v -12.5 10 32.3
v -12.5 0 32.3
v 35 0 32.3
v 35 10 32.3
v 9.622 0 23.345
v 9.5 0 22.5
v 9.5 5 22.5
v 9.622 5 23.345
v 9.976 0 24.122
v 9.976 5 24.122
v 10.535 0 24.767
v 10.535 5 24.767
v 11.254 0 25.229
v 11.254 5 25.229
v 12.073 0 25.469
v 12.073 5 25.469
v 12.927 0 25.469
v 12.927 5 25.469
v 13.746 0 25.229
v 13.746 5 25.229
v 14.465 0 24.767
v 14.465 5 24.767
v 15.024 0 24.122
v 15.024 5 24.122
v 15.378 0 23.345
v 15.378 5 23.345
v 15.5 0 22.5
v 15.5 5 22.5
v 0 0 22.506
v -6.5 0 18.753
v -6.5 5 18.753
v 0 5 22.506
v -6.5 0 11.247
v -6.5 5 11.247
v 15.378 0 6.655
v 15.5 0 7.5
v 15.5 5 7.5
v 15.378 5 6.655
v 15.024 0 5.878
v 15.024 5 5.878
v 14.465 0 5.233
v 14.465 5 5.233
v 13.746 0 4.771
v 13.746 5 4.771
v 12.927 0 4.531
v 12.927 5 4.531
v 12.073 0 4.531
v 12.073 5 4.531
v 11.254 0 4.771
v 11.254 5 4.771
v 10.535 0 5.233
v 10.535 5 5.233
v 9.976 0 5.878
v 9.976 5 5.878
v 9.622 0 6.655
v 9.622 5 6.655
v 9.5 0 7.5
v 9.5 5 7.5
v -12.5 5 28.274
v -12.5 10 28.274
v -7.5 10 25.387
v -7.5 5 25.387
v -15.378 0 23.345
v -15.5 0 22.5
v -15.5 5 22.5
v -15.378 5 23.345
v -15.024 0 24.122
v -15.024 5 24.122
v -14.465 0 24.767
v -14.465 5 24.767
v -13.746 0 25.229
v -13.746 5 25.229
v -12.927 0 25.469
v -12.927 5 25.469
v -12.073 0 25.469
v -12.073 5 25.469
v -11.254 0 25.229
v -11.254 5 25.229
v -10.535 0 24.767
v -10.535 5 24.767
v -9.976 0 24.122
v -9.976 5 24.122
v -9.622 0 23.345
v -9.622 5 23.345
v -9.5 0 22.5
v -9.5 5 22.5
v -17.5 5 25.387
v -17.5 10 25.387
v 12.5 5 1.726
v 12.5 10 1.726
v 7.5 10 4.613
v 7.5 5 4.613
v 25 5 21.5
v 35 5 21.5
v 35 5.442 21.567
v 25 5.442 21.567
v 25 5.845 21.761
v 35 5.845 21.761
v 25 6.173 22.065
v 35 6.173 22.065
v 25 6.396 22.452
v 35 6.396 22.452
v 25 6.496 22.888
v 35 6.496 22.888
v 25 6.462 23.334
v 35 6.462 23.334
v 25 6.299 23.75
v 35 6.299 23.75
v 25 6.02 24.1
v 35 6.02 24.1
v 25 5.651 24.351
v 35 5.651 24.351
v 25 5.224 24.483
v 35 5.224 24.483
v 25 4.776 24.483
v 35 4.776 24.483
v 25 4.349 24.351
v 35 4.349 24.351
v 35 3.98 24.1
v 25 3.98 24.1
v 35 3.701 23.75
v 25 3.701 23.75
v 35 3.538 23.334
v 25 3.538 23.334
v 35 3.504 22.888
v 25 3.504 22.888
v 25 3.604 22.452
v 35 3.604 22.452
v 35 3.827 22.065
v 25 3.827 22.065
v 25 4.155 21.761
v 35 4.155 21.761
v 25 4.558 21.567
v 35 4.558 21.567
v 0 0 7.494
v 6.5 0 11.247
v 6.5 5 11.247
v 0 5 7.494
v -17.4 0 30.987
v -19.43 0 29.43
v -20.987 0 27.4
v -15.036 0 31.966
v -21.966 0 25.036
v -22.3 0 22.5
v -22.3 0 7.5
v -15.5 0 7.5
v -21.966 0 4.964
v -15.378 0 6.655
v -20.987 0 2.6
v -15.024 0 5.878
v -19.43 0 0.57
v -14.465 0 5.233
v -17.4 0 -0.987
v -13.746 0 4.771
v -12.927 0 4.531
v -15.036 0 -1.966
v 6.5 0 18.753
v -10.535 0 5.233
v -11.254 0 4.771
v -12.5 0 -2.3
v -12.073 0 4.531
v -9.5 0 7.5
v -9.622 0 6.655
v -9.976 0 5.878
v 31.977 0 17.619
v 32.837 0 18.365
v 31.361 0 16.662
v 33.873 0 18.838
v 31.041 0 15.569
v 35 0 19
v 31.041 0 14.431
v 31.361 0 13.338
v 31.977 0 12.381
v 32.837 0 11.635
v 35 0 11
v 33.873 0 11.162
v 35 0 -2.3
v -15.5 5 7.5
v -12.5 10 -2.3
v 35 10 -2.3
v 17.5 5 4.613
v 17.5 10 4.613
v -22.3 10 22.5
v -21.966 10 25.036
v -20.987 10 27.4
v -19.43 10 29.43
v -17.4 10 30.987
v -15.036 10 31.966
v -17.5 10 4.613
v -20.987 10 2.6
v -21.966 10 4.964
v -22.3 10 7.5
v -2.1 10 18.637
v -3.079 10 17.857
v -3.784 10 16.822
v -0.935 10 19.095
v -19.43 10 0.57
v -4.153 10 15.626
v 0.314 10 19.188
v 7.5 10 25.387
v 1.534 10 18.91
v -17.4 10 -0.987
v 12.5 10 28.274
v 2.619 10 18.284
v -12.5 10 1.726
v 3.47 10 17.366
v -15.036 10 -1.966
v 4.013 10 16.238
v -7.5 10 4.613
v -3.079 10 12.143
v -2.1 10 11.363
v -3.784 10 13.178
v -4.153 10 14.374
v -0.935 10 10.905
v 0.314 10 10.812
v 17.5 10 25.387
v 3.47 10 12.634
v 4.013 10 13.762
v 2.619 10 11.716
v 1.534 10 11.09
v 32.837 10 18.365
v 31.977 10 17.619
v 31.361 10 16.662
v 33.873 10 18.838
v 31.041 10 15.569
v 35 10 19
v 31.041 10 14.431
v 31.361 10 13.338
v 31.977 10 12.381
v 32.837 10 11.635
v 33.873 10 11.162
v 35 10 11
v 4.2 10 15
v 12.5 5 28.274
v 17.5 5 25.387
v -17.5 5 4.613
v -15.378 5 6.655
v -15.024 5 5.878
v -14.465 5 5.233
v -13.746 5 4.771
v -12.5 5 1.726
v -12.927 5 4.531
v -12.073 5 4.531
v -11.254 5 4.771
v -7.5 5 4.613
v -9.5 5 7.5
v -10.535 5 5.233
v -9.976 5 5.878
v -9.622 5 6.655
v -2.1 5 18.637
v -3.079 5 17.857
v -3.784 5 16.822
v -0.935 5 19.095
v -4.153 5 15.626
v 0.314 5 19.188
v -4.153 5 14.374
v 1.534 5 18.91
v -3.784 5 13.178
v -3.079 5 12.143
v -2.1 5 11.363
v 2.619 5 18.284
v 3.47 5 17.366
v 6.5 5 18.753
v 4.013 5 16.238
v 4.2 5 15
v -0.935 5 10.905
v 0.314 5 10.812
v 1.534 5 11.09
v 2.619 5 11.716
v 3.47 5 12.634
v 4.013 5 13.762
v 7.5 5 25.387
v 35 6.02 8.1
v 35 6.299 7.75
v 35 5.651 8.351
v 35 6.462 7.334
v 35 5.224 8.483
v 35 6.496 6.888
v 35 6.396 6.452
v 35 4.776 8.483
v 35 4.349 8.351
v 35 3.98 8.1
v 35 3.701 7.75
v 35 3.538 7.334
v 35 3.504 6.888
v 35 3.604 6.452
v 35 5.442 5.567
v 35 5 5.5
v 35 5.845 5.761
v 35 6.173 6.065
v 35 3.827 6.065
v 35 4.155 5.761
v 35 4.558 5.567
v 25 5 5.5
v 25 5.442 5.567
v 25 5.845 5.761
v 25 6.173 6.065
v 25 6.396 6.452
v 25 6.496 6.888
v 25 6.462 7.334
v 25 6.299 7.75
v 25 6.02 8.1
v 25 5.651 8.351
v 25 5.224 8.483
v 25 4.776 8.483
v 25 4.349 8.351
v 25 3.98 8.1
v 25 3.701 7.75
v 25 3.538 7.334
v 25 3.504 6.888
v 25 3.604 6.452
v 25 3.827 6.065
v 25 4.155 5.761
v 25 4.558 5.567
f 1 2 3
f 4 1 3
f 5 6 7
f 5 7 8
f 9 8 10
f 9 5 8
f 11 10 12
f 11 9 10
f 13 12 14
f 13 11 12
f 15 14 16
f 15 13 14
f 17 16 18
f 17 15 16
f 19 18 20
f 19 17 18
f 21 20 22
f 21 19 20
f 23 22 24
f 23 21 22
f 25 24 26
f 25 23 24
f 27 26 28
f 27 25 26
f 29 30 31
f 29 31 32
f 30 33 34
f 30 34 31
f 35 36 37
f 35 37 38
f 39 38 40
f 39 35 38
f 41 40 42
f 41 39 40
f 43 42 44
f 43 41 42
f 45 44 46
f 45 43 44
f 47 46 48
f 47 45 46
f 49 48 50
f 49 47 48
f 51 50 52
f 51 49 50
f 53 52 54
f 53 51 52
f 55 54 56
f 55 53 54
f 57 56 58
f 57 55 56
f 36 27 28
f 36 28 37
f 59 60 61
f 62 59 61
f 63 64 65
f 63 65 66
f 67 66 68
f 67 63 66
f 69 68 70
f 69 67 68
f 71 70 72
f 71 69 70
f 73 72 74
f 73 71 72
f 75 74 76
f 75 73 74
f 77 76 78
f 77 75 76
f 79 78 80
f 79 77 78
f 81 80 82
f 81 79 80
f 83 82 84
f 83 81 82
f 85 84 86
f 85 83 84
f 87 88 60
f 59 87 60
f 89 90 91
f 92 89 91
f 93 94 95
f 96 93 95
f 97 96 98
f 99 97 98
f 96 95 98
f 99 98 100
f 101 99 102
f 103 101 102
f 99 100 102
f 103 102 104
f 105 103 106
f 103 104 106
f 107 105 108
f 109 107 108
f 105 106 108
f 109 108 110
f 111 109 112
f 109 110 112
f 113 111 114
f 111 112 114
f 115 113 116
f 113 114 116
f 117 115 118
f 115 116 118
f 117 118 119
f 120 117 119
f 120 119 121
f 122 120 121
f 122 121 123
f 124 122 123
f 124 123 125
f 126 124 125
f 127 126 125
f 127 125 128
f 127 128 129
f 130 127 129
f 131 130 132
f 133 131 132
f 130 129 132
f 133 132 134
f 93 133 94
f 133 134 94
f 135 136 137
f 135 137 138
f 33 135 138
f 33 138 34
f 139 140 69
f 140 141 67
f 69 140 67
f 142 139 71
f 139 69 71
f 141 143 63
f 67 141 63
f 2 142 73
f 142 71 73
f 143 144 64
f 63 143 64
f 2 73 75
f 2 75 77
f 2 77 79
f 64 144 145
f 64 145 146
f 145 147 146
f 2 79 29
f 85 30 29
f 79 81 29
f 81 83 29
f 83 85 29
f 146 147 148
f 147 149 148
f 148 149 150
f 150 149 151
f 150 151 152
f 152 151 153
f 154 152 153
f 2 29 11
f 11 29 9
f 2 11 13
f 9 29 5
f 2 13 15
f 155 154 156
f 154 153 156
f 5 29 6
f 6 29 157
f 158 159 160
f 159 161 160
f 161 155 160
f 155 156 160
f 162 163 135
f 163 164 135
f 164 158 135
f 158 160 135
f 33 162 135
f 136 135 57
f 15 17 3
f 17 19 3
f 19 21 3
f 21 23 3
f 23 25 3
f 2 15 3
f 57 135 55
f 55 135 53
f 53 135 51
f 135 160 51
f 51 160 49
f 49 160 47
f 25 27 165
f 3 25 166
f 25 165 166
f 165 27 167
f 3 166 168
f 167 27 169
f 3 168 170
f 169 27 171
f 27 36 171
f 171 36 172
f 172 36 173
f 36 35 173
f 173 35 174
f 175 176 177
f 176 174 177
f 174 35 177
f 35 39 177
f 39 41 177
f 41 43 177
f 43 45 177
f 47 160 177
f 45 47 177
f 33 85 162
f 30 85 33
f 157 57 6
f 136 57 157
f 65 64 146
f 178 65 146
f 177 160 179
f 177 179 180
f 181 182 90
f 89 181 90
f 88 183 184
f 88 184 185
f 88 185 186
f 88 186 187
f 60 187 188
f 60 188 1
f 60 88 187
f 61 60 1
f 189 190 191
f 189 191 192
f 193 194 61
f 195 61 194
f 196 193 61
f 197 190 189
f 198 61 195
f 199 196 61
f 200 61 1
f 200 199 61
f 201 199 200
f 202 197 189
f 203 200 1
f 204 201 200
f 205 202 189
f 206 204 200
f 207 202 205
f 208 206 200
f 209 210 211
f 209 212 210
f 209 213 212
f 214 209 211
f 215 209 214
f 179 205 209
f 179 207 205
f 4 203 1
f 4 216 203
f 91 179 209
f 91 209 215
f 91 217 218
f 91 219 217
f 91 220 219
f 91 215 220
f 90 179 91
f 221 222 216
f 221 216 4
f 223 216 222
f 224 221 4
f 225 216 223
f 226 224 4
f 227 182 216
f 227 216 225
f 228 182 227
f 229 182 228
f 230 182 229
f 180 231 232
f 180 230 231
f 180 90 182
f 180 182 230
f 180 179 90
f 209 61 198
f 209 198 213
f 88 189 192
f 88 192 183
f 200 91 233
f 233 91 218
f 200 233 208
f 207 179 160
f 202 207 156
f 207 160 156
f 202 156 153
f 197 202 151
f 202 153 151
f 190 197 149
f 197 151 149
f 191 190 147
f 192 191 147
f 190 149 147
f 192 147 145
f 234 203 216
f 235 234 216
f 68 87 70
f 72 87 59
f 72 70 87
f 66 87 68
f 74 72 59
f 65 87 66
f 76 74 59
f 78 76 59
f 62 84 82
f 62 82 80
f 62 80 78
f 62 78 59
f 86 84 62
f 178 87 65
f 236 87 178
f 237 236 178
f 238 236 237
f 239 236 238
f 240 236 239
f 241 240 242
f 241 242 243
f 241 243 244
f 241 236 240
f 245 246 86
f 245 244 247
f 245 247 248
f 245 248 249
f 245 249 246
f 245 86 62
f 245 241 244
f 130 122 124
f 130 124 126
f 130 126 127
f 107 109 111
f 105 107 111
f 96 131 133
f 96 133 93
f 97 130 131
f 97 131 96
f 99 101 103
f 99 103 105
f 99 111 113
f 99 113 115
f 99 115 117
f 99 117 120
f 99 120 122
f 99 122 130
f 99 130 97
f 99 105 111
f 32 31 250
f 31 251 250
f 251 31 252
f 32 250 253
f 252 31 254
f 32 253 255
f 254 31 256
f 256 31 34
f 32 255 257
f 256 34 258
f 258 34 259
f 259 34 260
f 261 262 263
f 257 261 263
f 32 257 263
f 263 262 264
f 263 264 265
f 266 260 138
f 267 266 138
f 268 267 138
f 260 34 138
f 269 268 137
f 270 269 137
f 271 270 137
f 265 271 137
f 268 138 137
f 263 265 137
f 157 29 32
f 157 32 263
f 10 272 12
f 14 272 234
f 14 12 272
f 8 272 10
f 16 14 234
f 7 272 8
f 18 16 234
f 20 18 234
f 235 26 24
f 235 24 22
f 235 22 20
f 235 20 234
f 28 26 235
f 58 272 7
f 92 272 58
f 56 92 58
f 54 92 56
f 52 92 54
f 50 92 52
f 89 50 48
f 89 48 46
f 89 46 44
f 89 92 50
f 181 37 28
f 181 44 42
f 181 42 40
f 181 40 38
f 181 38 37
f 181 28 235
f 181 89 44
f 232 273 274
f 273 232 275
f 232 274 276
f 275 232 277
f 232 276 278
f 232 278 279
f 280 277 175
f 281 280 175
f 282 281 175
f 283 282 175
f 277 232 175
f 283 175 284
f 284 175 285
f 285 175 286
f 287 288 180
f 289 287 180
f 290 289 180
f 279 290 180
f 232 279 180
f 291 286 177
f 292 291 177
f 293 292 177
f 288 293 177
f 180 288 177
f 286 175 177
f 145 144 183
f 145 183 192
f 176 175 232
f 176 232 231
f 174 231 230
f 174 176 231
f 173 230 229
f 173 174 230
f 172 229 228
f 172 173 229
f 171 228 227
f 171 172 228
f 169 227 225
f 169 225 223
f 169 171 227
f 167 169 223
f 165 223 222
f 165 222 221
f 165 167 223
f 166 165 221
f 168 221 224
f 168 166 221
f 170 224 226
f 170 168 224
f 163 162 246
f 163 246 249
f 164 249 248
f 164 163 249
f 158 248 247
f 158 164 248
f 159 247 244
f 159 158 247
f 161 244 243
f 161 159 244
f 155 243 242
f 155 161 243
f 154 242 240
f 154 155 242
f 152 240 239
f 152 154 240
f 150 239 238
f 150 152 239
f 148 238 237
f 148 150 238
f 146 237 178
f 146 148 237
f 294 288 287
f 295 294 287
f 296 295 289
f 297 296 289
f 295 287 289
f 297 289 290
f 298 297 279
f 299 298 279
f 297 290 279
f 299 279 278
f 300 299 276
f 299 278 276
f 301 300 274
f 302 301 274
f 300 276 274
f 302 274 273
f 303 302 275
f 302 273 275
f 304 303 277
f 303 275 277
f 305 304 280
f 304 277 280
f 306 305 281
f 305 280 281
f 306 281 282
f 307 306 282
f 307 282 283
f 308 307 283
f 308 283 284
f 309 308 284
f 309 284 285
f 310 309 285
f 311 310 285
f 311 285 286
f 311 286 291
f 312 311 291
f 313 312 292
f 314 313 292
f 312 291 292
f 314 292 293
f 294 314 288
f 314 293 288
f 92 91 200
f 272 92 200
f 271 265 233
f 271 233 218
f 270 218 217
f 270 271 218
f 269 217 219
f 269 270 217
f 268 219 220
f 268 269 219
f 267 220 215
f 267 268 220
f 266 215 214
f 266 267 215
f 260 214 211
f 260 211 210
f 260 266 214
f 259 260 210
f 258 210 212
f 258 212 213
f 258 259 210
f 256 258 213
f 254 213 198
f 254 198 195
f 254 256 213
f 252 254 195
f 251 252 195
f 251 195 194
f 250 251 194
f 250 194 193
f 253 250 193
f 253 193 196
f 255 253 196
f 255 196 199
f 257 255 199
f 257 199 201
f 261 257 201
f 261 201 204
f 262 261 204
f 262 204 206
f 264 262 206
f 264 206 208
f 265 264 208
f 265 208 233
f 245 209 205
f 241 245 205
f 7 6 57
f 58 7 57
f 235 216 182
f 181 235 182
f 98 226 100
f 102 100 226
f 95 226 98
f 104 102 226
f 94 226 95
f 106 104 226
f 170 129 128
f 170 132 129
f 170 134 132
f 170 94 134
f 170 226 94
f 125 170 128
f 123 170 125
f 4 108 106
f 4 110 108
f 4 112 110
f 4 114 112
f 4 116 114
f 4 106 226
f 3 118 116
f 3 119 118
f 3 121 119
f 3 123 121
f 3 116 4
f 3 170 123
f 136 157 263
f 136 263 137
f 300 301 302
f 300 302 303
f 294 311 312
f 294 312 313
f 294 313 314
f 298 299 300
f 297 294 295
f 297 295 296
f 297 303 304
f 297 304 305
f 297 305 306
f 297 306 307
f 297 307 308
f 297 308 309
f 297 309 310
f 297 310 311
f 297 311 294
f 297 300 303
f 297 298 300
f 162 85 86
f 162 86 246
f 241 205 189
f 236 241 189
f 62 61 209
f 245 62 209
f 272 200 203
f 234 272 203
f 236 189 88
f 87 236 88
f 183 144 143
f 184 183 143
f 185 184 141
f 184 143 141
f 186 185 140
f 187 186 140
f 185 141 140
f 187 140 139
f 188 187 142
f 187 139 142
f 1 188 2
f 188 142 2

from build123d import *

# Parameters (mm, degrees)
SKETCH_R             = 4.2
PAD_DEPTH            = 10
POCKET_DEPTH         = 5
POCKET001_DEPTH      = 5
SKETCH003_R          = 1.5
POCKET002_DEPTH      = 10
BODY_PLACEMENT_ANGLE = 270


with BuildPart() as part:
    # Sketch → Pad (new body)
    with BuildSketch(Plane.XY):
        with BuildLine():
            ThreePointArc((-22.3, -7.500028), (-19.429637, -14.429656), (-12.5, -17.3))
            Line((-12.5, -17.3), (35, -17.3))
            Line((35, -4), (35, -17.3))
            ThreePointArc((35, 4), (31, 0), (35, -4))
            Line((35, 4), (35, 17.3))
            Line((-12.5, 17.3), (35, 17.3))
            ThreePointArc((-12.5, 17.3), (-19.429639, 14.429654), (-22.3, 7.500021))
            Line((-22.3, -7.500028), (-22.3, 7.500021))
        make_face()
        Circle(SKETCH_R, mode=Mode.SUBTRACT)
        with BuildLine():
            ThreePointArc((-15.5, -7.5), (-12.5, -10.5), (-9.5, -7.5))
            Line((-9.5, -7.5), (-9.5, 7.5))
            ThreePointArc((-9.5, 7.5), (-12.5, 10.5), (-15.5, 7.5))
            Line((-15.5, -7.5), (-15.5, 7.5))
        make_face(mode=Mode.SUBTRACT)
        with BuildLine():
            ThreePointArc((9.5, -7.5), (12.5, -10.5), (15.5, -7.5))
            Line((15.5, -7.5), (15.5, 7.5))
            ThreePointArc((15.5, 7.5), (12.5, 10.5), (9.5, 7.5))
            Line((9.5, -7.5), (9.5, 7.5))
        make_face(mode=Mode.SUBTRACT)
    extrude(amount=PAD_DEPTH)

    # Sketch001 (on Face19 of Pad) → Pocket (cut)
    with BuildSketch(Plane.XY.offset(10)):
        Polygon((-12.5, 13.273503), (-17.5, 10.386751), (-17.5, 4.613249), (-17.5, -4.613249), (-17.5, -10.386751), (-12.5, -13.273503), (-7.5, -10.386751), (-7.5, -4.613249), (-7.5, 4.613249), (-7.5, 10.386751), align=None)
        Polygon((7.5, -4.613249), (7.5, -10.386751), (12.5, -13.273503), (17.5, -10.386751), (17.5, -4.613249), (17.5, 4.613249), (17.5, 10.386751), (12.5, 13.273503), (7.5, 10.386751), (7.5, 4.613249), align=None)
    extrude(amount=-POCKET_DEPTH, mode=Mode.SUBTRACT)

    # Sketch002 → Pocket001 (cut)
    with BuildSketch(Plane.XY):
        Polygon((-6.5, 3.752777), (-6.5, -3.752777), (0, -7.505553), (6.5, -3.752777), (6.5, 3.752777), (0, 7.505553), align=None)
    extrude(amount=POCKET001_DEPTH, mode=Mode.SUBTRACT)

    # Sketch003 (on Face10 of Pocket001) → Pocket002 (cut)
    with BuildSketch(Plane.YZ.offset(35)):
        with Locations((-8, 5)):
            Circle(SKETCH003_R)
        with Locations((8, 5)):
            Circle(SKETCH003_R)
    extrude(amount=-POCKET002_DEPTH, mode=Mode.SUBTRACT)


with BuildPart() as part_1:
    # Body placement: moved
    add(part.part.moved(Location((0, 0, 15))).rotate(Axis((0, 0, 15), (1, 0, 0)), BODY_PLACEMENT_ANGLE))


solid = part_1.part
